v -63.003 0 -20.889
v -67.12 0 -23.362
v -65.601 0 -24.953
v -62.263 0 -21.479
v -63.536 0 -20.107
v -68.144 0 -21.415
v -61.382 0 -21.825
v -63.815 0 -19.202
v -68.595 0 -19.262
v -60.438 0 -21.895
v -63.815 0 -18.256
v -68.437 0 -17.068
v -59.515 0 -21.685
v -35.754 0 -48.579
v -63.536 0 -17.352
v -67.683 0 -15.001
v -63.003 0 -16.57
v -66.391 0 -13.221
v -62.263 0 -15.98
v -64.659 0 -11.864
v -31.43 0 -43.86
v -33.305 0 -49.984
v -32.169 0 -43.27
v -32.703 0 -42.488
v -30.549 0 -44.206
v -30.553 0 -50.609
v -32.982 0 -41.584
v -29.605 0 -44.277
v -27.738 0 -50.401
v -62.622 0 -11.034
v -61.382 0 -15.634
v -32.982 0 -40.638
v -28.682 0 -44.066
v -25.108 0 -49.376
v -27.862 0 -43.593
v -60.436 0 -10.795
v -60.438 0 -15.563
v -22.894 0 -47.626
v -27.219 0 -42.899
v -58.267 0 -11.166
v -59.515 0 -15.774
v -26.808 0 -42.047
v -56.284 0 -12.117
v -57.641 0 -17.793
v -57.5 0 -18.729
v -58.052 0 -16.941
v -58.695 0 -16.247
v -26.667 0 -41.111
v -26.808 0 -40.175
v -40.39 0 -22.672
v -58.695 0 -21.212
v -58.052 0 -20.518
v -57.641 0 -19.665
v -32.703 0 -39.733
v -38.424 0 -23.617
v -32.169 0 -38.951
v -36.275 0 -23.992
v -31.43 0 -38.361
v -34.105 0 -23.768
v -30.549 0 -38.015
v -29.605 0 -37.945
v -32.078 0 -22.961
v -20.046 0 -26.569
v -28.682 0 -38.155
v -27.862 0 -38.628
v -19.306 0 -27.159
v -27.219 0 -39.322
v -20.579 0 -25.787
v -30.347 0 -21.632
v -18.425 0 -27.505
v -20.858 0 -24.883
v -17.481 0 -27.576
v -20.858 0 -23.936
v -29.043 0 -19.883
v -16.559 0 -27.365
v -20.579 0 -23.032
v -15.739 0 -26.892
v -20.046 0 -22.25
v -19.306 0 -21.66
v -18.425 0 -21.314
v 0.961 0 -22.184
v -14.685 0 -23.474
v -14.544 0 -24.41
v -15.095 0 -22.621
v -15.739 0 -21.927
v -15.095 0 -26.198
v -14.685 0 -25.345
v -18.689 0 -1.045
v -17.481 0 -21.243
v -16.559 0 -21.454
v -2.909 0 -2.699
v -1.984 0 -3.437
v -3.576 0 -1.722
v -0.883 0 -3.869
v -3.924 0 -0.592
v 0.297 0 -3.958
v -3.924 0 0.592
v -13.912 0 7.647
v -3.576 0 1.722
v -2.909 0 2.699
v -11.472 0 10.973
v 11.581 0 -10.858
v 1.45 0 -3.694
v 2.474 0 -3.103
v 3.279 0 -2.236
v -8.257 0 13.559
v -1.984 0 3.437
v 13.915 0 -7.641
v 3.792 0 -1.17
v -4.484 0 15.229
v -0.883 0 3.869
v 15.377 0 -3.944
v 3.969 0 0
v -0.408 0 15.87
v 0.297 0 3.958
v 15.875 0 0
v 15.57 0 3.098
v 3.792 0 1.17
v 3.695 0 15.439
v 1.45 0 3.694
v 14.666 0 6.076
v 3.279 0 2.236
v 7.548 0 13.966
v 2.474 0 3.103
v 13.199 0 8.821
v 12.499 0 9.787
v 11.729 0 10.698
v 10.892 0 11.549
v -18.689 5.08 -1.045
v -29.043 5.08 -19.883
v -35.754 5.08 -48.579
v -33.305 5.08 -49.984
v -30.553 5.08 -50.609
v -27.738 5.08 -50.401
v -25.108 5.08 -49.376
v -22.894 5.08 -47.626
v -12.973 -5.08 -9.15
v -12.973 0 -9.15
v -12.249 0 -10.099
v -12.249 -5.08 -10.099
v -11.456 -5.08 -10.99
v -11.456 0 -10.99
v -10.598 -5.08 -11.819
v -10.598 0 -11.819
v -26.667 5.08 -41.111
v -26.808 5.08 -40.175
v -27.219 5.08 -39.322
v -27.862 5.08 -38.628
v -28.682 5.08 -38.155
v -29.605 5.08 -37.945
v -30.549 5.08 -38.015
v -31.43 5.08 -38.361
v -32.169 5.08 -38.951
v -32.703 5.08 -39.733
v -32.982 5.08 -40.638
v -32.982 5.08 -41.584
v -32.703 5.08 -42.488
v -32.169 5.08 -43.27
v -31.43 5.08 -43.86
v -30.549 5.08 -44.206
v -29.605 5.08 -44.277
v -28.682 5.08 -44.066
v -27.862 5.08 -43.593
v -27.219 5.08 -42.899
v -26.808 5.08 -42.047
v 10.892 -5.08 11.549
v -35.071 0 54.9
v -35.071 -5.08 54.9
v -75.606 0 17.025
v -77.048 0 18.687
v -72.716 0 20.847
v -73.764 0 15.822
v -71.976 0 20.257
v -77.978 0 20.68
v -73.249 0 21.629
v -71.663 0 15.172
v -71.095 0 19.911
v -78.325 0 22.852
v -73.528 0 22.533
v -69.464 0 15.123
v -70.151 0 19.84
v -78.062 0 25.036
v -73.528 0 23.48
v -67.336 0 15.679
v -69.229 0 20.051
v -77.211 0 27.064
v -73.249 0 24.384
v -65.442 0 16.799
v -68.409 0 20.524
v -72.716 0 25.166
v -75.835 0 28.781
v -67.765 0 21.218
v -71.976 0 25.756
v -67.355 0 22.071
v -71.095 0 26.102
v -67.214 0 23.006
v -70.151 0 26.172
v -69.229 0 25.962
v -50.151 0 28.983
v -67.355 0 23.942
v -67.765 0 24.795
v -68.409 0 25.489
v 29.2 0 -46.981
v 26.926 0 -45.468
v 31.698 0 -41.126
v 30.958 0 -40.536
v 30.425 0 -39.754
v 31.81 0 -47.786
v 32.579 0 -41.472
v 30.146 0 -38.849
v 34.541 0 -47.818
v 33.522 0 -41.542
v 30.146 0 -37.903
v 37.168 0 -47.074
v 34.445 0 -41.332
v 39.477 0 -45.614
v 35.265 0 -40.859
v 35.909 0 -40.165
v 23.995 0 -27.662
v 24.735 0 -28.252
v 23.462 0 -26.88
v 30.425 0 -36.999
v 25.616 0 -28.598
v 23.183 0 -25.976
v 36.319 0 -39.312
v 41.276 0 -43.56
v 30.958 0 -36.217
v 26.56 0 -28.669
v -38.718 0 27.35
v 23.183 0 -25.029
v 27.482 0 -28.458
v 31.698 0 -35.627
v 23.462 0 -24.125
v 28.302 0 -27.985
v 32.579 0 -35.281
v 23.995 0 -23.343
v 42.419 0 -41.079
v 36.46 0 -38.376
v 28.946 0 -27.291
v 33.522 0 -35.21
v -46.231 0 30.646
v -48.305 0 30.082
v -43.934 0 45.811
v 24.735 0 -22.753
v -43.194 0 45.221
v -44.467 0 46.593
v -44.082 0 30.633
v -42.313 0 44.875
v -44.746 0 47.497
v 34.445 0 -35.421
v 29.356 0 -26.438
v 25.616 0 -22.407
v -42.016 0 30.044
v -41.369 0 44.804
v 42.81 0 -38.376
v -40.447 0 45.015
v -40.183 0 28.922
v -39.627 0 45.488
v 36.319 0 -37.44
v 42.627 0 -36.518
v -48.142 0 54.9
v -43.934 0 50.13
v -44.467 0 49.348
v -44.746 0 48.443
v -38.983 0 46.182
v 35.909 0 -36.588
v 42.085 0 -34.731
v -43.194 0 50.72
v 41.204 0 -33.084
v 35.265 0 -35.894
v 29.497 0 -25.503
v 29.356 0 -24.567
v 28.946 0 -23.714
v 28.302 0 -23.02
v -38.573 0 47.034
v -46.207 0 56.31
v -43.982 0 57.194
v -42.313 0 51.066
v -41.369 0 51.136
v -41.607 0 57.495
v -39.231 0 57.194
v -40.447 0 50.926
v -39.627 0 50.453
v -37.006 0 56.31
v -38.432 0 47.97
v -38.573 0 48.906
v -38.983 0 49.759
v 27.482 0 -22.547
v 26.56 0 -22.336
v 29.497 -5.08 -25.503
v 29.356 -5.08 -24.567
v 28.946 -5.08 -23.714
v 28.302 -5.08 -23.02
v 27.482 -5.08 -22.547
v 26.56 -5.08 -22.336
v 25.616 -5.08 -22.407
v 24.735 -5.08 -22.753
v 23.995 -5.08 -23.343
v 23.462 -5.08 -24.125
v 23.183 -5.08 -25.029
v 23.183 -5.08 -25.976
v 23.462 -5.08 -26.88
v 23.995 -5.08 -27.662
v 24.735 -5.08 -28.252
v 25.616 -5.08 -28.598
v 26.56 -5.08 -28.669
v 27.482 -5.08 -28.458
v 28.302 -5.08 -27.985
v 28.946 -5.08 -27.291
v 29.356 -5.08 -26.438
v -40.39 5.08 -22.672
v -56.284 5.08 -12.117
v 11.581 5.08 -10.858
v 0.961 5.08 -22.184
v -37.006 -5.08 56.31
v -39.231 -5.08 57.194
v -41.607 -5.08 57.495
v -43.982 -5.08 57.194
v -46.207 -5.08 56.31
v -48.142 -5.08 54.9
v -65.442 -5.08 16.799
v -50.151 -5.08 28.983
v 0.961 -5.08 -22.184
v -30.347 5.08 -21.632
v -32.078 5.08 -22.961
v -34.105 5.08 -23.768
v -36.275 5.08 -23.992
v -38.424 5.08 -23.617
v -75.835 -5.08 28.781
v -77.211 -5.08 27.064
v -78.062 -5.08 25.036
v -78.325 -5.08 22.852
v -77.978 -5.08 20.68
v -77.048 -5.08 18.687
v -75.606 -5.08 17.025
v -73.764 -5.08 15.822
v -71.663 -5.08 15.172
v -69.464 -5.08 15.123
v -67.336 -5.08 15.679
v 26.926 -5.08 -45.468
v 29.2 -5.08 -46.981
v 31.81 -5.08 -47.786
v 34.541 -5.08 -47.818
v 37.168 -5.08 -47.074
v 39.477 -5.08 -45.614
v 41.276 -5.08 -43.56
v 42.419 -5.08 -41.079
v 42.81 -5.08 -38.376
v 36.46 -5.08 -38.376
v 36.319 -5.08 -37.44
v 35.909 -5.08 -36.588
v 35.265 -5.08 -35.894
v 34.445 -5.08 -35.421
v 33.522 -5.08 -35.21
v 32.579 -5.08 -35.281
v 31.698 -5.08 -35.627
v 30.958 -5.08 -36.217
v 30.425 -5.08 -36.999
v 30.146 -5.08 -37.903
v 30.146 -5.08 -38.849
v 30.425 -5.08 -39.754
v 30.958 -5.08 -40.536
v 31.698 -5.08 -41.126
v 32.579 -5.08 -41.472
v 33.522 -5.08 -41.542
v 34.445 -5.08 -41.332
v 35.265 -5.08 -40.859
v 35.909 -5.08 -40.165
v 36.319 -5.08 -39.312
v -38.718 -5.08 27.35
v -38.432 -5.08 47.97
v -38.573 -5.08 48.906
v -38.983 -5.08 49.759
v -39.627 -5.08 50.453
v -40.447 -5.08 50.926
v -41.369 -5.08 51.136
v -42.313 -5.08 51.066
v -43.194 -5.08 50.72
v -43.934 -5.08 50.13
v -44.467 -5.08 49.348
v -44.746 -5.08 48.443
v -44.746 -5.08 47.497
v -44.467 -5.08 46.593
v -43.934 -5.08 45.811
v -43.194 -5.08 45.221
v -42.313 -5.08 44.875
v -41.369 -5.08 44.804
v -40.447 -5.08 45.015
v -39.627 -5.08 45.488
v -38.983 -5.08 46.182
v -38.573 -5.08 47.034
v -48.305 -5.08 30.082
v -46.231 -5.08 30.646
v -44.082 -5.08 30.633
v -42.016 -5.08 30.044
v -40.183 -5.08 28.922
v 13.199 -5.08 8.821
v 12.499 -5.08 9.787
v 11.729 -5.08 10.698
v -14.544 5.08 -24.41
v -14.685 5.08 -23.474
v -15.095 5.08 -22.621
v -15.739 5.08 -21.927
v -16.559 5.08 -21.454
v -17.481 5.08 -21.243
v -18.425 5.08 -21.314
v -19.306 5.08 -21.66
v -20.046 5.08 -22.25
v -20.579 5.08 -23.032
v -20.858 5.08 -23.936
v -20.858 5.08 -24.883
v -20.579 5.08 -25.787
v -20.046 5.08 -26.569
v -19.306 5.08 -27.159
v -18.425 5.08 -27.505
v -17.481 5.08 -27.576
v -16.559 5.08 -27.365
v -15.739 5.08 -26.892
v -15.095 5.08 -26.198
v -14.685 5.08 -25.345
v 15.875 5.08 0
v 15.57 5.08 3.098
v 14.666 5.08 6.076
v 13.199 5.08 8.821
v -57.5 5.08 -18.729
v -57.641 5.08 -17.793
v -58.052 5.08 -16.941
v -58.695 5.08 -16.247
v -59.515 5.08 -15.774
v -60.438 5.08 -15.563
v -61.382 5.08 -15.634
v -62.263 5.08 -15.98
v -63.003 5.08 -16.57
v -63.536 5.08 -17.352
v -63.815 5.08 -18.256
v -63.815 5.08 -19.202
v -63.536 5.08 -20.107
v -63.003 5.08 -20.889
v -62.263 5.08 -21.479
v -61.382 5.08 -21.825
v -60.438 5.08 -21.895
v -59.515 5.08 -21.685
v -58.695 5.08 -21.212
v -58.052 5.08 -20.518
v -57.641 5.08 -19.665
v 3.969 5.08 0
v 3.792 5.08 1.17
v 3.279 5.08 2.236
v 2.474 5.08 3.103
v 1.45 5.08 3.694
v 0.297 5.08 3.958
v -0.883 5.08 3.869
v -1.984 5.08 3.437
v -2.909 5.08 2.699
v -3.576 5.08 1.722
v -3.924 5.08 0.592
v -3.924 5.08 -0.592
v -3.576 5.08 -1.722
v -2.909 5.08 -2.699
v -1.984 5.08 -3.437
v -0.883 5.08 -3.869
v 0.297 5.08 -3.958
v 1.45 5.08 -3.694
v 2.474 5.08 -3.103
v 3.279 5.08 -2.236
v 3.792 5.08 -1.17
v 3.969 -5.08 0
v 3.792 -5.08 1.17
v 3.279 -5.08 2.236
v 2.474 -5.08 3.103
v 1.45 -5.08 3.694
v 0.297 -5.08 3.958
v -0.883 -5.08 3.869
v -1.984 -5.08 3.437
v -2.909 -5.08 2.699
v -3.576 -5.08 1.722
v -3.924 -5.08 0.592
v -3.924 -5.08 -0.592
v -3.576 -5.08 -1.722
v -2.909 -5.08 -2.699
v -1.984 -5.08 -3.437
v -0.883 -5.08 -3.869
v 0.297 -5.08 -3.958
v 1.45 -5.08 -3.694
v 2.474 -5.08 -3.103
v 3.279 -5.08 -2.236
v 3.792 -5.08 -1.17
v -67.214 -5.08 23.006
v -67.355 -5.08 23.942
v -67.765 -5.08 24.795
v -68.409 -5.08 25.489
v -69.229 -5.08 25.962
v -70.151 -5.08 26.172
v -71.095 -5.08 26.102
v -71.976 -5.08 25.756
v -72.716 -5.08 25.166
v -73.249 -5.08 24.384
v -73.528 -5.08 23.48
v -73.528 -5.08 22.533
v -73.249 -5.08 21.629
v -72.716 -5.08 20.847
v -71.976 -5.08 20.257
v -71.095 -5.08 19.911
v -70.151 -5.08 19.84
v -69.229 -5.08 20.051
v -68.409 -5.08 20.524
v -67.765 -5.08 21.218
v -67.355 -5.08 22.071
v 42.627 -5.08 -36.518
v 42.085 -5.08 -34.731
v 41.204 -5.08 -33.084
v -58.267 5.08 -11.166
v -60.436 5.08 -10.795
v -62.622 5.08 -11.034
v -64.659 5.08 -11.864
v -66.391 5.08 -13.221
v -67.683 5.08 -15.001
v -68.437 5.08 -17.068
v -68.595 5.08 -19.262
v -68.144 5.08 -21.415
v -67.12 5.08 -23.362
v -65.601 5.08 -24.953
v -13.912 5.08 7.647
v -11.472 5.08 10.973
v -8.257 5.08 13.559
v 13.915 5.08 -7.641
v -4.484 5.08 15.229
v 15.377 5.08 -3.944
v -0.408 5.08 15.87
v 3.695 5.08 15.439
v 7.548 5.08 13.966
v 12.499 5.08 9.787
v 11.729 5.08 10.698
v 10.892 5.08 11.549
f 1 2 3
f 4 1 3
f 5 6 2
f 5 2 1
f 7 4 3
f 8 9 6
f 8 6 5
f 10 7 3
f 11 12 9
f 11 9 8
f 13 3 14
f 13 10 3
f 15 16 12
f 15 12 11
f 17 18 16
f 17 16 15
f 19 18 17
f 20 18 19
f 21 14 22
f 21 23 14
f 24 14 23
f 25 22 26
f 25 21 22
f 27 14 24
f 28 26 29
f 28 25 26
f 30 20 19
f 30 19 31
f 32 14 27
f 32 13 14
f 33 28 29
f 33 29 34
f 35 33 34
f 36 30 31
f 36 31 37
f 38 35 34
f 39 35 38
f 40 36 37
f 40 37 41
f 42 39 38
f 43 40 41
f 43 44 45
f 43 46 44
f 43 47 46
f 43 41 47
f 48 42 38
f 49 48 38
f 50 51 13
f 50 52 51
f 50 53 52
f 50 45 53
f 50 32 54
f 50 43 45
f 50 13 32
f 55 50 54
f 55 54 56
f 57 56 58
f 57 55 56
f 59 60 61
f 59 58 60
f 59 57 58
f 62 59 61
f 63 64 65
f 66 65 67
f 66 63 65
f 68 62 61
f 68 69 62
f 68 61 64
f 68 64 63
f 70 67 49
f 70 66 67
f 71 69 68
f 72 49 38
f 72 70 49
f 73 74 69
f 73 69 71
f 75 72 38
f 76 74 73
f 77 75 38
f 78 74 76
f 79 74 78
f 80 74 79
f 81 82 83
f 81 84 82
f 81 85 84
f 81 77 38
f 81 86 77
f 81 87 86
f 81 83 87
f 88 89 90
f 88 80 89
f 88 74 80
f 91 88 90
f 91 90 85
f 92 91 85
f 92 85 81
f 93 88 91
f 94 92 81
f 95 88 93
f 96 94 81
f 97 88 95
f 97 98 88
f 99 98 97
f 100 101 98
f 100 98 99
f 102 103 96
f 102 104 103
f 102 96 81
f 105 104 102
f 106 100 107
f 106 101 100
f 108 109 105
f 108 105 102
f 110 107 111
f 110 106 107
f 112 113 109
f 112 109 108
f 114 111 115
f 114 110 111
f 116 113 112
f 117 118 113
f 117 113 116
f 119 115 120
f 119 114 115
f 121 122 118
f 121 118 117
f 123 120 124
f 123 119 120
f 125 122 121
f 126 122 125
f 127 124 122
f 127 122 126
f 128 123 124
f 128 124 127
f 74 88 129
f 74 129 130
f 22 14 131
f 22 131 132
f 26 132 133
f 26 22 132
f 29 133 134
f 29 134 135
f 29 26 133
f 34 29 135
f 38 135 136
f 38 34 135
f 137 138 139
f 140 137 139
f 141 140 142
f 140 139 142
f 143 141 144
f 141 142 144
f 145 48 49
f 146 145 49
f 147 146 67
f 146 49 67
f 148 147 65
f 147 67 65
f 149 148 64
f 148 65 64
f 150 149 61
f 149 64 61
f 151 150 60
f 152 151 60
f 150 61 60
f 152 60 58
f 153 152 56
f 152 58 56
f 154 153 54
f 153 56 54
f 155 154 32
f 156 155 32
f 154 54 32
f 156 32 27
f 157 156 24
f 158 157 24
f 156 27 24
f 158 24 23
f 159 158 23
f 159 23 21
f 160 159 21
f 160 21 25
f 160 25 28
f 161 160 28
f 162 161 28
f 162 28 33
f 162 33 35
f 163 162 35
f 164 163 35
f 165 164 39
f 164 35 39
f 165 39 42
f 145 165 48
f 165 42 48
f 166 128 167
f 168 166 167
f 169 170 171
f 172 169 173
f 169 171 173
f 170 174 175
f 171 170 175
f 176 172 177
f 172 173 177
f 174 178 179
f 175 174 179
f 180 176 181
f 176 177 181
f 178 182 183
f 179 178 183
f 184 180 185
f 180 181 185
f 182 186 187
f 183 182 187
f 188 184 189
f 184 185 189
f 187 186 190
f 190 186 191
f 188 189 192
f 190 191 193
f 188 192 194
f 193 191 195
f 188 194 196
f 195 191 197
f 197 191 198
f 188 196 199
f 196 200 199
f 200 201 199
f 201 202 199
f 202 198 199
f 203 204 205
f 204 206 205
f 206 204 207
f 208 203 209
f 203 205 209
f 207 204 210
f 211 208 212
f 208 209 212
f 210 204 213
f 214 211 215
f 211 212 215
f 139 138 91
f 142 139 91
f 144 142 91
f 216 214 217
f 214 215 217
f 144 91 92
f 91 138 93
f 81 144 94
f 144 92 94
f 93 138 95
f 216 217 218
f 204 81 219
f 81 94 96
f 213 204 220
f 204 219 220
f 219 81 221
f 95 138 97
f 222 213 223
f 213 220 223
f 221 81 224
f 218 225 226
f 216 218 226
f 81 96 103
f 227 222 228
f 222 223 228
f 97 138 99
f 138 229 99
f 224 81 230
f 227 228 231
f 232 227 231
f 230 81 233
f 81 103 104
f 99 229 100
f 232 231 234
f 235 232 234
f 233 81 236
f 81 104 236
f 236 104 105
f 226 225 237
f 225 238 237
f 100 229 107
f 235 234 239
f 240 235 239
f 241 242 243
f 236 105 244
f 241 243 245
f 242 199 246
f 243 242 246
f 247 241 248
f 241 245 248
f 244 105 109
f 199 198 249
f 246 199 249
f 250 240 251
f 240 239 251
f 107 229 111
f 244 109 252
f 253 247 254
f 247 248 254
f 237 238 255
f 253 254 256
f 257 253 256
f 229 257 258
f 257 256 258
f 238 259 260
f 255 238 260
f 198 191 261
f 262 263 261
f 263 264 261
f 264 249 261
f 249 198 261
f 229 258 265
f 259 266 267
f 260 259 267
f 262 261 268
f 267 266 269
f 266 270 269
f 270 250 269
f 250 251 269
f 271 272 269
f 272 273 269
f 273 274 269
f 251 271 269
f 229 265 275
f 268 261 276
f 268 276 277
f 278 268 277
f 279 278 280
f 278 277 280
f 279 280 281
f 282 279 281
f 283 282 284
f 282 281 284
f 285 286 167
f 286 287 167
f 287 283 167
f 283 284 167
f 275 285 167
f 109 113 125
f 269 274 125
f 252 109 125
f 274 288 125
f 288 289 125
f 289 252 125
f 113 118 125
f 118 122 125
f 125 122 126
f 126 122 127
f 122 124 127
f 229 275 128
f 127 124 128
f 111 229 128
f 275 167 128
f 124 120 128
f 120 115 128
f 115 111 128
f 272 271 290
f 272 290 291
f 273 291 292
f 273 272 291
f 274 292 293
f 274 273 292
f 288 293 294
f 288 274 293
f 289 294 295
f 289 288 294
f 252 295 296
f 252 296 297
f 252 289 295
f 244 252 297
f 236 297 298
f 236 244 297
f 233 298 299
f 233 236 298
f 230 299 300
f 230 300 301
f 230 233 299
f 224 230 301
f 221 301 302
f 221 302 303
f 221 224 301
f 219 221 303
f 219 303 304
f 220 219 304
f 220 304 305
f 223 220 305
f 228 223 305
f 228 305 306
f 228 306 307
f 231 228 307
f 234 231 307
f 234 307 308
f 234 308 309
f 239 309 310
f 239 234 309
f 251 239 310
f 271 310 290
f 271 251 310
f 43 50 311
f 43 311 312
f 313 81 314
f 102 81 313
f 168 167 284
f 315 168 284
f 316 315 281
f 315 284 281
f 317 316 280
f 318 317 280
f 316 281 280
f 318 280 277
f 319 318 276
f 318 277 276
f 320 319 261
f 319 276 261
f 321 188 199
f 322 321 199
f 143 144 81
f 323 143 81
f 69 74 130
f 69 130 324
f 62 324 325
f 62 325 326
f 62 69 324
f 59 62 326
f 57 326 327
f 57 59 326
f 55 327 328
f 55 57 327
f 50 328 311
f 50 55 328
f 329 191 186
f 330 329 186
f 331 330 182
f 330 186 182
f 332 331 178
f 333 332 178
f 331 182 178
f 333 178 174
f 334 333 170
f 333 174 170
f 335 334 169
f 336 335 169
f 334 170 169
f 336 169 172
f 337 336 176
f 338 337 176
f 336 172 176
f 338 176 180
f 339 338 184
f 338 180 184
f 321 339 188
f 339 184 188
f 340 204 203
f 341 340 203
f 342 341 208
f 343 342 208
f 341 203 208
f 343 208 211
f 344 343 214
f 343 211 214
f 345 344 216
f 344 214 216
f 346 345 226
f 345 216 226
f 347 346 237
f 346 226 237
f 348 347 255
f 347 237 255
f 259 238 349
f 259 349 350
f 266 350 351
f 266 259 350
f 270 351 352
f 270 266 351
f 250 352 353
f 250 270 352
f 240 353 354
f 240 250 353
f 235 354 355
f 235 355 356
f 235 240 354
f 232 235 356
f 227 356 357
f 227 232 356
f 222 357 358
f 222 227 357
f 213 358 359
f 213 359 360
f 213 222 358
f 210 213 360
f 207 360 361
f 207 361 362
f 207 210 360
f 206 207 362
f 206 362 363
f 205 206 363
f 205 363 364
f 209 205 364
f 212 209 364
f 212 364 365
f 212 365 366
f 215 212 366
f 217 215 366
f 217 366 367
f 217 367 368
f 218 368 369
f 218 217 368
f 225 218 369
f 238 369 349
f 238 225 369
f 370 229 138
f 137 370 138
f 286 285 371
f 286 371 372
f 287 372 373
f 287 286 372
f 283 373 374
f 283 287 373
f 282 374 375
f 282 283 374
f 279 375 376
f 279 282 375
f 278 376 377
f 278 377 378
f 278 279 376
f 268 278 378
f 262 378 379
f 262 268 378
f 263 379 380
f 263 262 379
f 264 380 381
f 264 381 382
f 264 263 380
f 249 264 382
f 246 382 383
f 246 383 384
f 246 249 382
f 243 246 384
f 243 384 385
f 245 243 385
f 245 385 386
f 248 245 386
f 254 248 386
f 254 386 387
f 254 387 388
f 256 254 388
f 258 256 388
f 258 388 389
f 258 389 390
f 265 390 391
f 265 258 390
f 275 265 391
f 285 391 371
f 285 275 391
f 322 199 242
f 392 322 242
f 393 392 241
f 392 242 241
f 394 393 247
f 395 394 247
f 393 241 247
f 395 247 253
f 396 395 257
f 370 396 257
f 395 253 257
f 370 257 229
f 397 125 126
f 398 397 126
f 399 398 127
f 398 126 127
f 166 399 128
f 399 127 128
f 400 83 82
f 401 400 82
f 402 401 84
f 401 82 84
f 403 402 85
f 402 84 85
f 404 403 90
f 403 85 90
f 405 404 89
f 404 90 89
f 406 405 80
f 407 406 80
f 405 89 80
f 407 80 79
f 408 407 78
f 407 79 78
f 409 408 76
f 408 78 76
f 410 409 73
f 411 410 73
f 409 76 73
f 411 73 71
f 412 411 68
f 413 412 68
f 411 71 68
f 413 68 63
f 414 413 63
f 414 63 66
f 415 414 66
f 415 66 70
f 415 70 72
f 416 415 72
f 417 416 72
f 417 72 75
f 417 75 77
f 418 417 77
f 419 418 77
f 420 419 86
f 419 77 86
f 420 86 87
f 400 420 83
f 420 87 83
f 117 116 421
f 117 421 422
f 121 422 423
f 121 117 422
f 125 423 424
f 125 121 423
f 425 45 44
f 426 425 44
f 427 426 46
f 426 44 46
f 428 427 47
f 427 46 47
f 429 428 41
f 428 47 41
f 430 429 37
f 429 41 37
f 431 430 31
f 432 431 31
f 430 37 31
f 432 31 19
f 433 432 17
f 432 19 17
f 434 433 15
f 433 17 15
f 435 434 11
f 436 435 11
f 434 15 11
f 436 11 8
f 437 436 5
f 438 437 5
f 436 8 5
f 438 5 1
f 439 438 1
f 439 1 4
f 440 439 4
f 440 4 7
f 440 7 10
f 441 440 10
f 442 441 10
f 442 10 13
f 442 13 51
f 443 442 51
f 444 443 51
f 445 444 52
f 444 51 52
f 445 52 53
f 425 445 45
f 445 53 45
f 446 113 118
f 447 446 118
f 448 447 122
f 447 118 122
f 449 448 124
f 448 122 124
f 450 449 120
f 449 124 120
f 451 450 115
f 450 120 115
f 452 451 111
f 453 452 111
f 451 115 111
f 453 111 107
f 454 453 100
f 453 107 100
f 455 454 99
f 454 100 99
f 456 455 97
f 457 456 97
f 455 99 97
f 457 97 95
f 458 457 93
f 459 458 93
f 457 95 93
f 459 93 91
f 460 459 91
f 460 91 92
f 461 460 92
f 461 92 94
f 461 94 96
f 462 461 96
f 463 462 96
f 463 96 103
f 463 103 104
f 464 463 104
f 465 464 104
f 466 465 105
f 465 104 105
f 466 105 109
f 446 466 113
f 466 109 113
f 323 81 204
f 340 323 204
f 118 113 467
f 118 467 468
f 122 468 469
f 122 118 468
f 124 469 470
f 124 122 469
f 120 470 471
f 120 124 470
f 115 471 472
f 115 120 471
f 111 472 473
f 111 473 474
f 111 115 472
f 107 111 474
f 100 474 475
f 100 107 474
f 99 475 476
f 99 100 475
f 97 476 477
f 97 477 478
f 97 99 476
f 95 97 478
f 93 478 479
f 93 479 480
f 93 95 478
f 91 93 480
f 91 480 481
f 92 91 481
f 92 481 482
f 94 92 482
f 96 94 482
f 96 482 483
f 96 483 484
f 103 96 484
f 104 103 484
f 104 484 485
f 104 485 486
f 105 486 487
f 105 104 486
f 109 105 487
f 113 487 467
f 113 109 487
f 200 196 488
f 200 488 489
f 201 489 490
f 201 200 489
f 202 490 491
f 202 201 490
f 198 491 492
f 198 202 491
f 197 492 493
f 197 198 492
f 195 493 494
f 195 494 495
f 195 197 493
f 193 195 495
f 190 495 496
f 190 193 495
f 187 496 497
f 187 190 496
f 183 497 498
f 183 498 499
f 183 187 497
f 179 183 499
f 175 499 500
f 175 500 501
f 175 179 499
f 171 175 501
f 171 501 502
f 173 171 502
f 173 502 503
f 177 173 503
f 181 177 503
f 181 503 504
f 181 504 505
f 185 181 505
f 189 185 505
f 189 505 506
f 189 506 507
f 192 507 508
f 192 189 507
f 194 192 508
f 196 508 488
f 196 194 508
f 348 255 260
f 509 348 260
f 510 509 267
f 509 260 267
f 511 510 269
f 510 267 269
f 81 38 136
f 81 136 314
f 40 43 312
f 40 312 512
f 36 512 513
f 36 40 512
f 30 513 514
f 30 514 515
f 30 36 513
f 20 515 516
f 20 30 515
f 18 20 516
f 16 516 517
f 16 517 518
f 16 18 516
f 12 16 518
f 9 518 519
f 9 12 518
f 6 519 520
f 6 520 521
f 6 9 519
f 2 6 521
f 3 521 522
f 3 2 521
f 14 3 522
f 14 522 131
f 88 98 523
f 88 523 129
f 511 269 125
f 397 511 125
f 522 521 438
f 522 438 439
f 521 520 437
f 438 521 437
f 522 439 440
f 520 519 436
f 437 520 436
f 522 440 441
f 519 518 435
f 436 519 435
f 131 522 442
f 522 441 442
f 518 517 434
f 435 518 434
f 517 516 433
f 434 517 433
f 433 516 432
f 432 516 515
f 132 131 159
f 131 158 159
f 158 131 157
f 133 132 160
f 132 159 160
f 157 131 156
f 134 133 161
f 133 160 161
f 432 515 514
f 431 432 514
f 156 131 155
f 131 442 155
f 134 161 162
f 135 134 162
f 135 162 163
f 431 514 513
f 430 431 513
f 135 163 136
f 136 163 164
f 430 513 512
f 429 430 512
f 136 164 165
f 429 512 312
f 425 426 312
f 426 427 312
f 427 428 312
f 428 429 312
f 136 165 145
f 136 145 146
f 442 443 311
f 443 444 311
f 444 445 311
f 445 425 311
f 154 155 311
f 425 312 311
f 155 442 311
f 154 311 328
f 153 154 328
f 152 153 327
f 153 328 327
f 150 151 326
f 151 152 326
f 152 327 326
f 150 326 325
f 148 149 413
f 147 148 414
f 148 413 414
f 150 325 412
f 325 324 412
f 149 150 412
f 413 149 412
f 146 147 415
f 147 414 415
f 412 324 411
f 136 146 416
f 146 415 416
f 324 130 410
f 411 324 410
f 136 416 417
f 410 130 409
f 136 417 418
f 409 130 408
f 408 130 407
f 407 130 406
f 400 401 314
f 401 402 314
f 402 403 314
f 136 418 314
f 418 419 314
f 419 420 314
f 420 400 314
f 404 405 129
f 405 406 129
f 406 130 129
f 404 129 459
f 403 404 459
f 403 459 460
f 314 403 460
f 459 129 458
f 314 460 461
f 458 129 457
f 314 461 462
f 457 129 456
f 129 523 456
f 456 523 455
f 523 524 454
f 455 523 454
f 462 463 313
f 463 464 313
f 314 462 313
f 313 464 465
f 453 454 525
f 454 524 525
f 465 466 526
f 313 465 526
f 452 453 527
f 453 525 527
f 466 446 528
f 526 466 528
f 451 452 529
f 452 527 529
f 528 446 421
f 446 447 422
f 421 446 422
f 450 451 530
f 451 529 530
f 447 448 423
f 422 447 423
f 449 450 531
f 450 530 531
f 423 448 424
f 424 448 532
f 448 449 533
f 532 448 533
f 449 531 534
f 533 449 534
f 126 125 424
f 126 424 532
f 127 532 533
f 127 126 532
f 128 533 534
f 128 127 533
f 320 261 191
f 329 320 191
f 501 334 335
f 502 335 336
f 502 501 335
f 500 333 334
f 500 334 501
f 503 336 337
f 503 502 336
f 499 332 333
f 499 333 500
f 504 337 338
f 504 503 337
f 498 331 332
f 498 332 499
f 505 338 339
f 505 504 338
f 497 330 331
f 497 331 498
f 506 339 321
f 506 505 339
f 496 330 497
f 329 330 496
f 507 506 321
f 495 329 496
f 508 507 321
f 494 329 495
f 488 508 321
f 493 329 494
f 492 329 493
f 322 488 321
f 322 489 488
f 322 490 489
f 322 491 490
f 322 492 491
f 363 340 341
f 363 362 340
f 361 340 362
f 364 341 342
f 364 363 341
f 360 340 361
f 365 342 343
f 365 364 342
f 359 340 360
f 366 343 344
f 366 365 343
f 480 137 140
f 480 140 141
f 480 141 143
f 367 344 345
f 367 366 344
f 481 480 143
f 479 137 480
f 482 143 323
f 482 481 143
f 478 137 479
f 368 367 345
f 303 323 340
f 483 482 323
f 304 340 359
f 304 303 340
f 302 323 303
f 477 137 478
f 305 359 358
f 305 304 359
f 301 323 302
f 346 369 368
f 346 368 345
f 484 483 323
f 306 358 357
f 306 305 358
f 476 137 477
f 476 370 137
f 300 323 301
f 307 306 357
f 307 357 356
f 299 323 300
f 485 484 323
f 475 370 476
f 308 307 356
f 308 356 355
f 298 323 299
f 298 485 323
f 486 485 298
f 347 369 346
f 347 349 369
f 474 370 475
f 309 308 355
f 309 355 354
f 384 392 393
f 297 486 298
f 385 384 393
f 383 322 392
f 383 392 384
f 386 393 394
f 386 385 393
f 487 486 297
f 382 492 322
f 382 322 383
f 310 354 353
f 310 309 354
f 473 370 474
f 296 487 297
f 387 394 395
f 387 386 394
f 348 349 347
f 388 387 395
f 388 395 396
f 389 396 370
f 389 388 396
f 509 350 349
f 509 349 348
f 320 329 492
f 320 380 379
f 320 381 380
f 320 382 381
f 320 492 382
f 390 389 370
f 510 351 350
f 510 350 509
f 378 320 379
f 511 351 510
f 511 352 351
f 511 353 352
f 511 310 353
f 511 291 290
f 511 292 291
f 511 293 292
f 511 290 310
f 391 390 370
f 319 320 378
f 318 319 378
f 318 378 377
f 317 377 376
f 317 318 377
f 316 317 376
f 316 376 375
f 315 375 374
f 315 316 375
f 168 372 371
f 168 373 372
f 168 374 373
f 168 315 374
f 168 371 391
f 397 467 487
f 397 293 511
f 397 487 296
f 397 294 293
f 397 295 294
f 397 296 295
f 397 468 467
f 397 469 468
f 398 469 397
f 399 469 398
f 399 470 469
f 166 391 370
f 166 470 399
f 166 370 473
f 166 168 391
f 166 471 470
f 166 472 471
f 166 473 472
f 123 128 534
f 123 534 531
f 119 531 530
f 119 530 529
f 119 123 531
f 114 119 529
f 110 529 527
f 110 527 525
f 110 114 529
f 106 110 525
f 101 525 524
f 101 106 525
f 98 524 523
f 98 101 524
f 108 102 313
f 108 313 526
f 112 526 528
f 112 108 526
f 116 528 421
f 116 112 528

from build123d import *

# Parameters (mm, degrees)
F0_R     = 3.175
F0_R_2   = 3.96875
F1_DEPTH = 5.08
F2_DEPTH = 5.08


with BuildPart() as f1:
    # F0 (on Front) → F1 (new body)
    with BuildSketch(Plane.XZ):
        with BuildLine():
            ThreePointArc((-13.9120535072, 7.6465935038), (-2.4670732808, 15.682129142), (10.8922900307, 11.5487507067))
            Line((10.8922900307, 11.5487507067), (-35.0711574392, 54.8995176744))
            ThreePointArc((-35.0711574392, 54.8995176744), (-32.8608164346, 51.7436071154), (-32.0815314576, 47.9702672503))
            ThreePointArc((-32.0815314576, 47.9702672503), (-45.3798713227, 39.2245522274), (-48.1419054761, 54.8995176744))
            Line((-48.1419054761, 54.8995176744), (-75.8348368232, 28.7807237291))
            ThreePointArc((-75.8348368232, 28.7807237291), (-67.2442419203, 30.2944442282), (-62.4511918078, 23.0063483758))
            ThreePointArc((-62.4511918078, 23.0063483758), (-63.237943921, 19.5609585706), (-65.4422370763, 16.798571653))
            Line((-65.4422370763, 16.798571653), (-50.1509863937, 28.9828821829))
            ThreePointArc((-50.1509863937, 28.9828821829), (-44.0823996147, 30.6328866939), (-38.7182233604, 27.3502241323))
            Line((-38.7182233604, 27.3502241323), (-18.6894428937, -1.0452895859))
            Line((-18.6894428937, -1.0452895859), (-13.9120535072, 7.6465935038))
        make_face()
        with BuildLine():
            ThreePointArc((-62.4511918078, 23.0063483758), (-67.2442419203, 30.2944442282), (-75.8348368232, 28.7807237291))
            ThreePointArc((-75.8348368232, 28.7807237291), (-76.3849752141, 17.8055319436), (-65.4422370763, 16.798571653))
            ThreePointArc((-65.4422370763, 16.798571653), (-63.237943921, 19.5609585706), (-62.4511918078, 23.0063483758))
        make_face()
        with Locations((-70.3886918078, 23.0063483758)):
            Circle(F0_R, mode=Mode.SUBTRACT)
        with BuildLine():
            ThreePointArc((-32.0815314576, 47.9702672503), (-32.8608164346, 51.7436071154), (-35.0711574392, 54.8995176744))
            ThreePointArc((-35.0711574392, 54.8995176744), (-41.6065314576, 57.4952672503), (-48.1419054761, 54.8995176744))
            ThreePointArc((-48.1419054761, 54.8995176744), (-45.3798713227, 39.2245522274), (-32.0815314576, 47.9702672503))
        make_face()
        with Locations((-41.6065314576, 47.9702672503)):
            Circle(F0_R, mode=Mode.SUBTRACT)
        with BuildLine():
            ThreePointArc((15.875, 0), (15.1912005478, 4.609018433), (13.1987101208, 8.820979319))
            ThreePointArc((13.1987101208, 8.820979319), (12.1224690662, 10.2499448164), (10.8922900307, 11.5487507067))
            ThreePointArc((10.8922900307, 11.5487507067), (-2.4670732808, 15.682129142), (-13.9120535072, 7.6465935038))
            ThreePointArc((-13.9120535072, 7.6465935038), (-15.8502288115, -0.8864940066), (-12.9726166036, -9.1502373442))
            ThreePointArc((-12.9726166036, -9.1502373442), (-11.8607666217, -10.5516747555), (-10.5983019047, -11.8191210221))
            ThreePointArc((-10.5983019047, -11.8191210221), (0.6870299902, -15.8601265692), (11.5806470113, -10.8583718761))
            ThreePointArc((11.5806470113, -10.8583718761), (14.7624252124, -5.8383582323), (15.875, 0))
        make_face()
        Circle(F0_R_2, mode=Mode.SUBTRACT)
        with BuildLine():
            Line((-10.5983019047, -11.8191210221), (0.9609865297, -22.1844289332))
            Line((0.9609865297, -22.1844289332), (11.5806470113, -10.8583718761))
            ThreePointArc((11.5806470113, -10.8583718761), (0.6870299902, -15.8601265692), (-10.5983019047, -11.8191210221))
        make_face()
        with BuildLine():
            ThreePointArc((-12.9726166036, -9.1502373442), (-15.8502288115, -0.8864940066), (-13.9120535072, 7.6465935038))
            Line((-13.9120535072, 7.6465935038), (-18.6894428937, -1.0452895859))
            Line((-18.6894428937, -1.0452895859), (-12.9726166036, -9.1502373442))
        make_face()
        with BuildLine():
            ThreePointArc((26.9262440233, -45.4676864135), (27.0442454474, -31.1806737127), (41.2044512386, -33.0836262089))
            Line((41.2044512386, -33.0836262089), (13.1987101208, 8.820979319))
            ThreePointArc((13.1987101208, 8.820979319), (15.1912005478, 4.609018433), (15.875, 0))
            ThreePointArc((15.875, 0), (14.7624252124, -5.8383582323), (11.5806470113, -10.8583718761))
            Line((11.5806470113, -10.8583718761), (0.9609865297, -22.1844289332))
            Line((0.9609865297, -22.1844289332), (26.9262440233, -45.4676864135))
        make_face()
        with Locations((26.3222689506, -25.5025770961)):
            Circle(F0_R, mode=Mode.SUBTRACT)
        with BuildLine():
            ThreePointArc((26.9262440233, -45.4676864135), (37.1682864336, -47.0737686401), (42.8102251661, -38.3762138003))
            ThreePointArc((42.8102251661, -38.3762138003), (42.3999454948, -35.6108027404), (41.2044512386, -33.0836262089))
            ThreePointArc((41.2044512386, -33.0836262089), (27.0442454474, -31.1806737127), (26.9262440233, -45.4676864135))
        make_face()
        with Locations((33.2852251661, -38.3762138003)):
            Circle(F0_R, mode=Mode.SUBTRACT)
    extrude(amount=F1_DEPTH)


with BuildPart() as f2:
    # F0 (on Front) → F2 (new body)
    with BuildSketch(Plane.XZ):
        with BuildLine():
            ThreePointArc((15.875, 0), (15.1912005478, 4.609018433), (13.1987101208, 8.820979319))
            ThreePointArc((13.1987101208, 8.820979319), (12.1224690662, 10.2499448164), (10.8922900307, 11.5487507067))
            ThreePointArc((10.8922900307, 11.5487507067), (-2.4670732808, 15.682129142), (-13.9120535072, 7.6465935038))
            ThreePointArc((-13.9120535072, 7.6465935038), (-15.8502288115, -0.8864940066), (-12.9726166036, -9.1502373442))
            ThreePointArc((-12.9726166036, -9.1502373442), (-11.8607666217, -10.5516747555), (-10.5983019047, -11.8191210221))
            ThreePointArc((-10.5983019047, -11.8191210221), (0.6870299902, -15.8601265692), (11.5806470113, -10.8583718761))
            ThreePointArc((11.5806470113, -10.8583718761), (14.7624252124, -5.8383582323), (15.875, 0))
        make_face()
        Circle(F0_R_2, mode=Mode.SUBTRACT)
        with BuildLine():
            Line((-10.5983019047, -11.8191210221), (0.9609865297, -22.1844289332))
            Line((0.9609865297, -22.1844289332), (11.5806470113, -10.8583718761))
            ThreePointArc((11.5806470113, -10.8583718761), (0.6870299902, -15.8601265692), (-10.5983019047, -11.8191210221))
        make_face()
        with BuildLine():
            ThreePointArc((-12.9726166036, -9.1502373442), (-15.8502288115, -0.8864940066), (-13.9120535072, 7.6465935038))
            Line((-13.9120535072, 7.6465935038), (-18.6894428937, -1.0452895859))
            Line((-18.6894428937, -1.0452895859), (-12.9726166036, -9.1502373442))
        make_face()
        with BuildLine():
            Line((-22.8936149415, -47.6257862918), (0.9609865297, -22.1844289332))
            Line((0.9609865297, -22.1844289332), (-10.5983019047, -11.8191210221))
            ThreePointArc((-10.5983019047, -11.8191210221), (-11.8607666217, -10.5516747555), (-12.9726166036, -9.1502373442))
            Line((-12.9726166036, -9.1502373442), (-18.6894428937, -1.0452895859))
            Line((-18.6894428937, -1.0452895859), (-29.0432294857, -19.8827540071))
            ThreePointArc((-29.0432294857, -19.8827540071), (-34.1047181558, -23.7675459742), (-40.3903716946, -22.6717194482))
            Line((-40.3903716946, -22.6717194482), (-56.2839600676, -12.1169986119))
            ThreePointArc((-56.2839600676, -12.1169986119), (-53.6801350236, -14.97763267), (-52.7375755228, -18.7292608049))
            ThreePointArc((-52.7375755228, -18.7292608049), (-57.2181612785, -25.8744445084), (-65.6014873735, -24.9529552485))
            Line((-65.6014873735, -24.9529552485), (-35.753697369, -48.5791964985))
            ThreePointArc((-35.753697369, -48.5791964985), (-33.9903002415, -32.5365427219), (-20.3170031483, -41.1107631661))
            ThreePointArc((-20.3170031483, -41.1107631661), (-20.9845480208, -44.6137781054), (-22.8936149415, -47.6257862918))
        make_face()
        with Locations((-17.7186893693, -24.4095156299)):
            Circle(F0_R, mode=Mode.SUBTRACT)
        with BuildLine():
            ThreePointArc((-35.753697369, -48.5791964985), (-29.1377792061, -50.6096943501), (-22.8936149415, -47.6257862918))
            ThreePointArc((-22.8936149415, -47.6257862918), (-20.9845480208, -44.6137781054), (-20.3170031483, -41.1107631661))
            ThreePointArc((-20.3170031483, -41.1107631661), (-33.9903002415, -32.5365427219), (-35.753697369, -48.5791964985))
        make_face()
        with Locations((-29.8420031483, -41.1107631661)):
            Circle(F0_R, mode=Mode.SUBTRACT)
        with BuildLine():
            ThreePointArc((-56.2839600676, -12.1169986119), (-67.0986322675, -14.066447813), (-65.6014873735, -24.9529552485))
            ThreePointArc((-65.6014873735, -24.9529552485), (-57.2181612785, -25.8744445084), (-52.7375755228, -18.7292608049))
            ThreePointArc((-52.7375755228, -18.7292608049), (-53.6801350236, -14.97763267), (-56.2839600676, -12.1169986119))
        make_face()
        with Locations((-60.6750755228, -18.7292608049)):
            Circle(F0_R, mode=Mode.SUBTRACT)
    extrude(amount=-F2_DEPTH)


solid = Compound([f1.part, f2.part])
